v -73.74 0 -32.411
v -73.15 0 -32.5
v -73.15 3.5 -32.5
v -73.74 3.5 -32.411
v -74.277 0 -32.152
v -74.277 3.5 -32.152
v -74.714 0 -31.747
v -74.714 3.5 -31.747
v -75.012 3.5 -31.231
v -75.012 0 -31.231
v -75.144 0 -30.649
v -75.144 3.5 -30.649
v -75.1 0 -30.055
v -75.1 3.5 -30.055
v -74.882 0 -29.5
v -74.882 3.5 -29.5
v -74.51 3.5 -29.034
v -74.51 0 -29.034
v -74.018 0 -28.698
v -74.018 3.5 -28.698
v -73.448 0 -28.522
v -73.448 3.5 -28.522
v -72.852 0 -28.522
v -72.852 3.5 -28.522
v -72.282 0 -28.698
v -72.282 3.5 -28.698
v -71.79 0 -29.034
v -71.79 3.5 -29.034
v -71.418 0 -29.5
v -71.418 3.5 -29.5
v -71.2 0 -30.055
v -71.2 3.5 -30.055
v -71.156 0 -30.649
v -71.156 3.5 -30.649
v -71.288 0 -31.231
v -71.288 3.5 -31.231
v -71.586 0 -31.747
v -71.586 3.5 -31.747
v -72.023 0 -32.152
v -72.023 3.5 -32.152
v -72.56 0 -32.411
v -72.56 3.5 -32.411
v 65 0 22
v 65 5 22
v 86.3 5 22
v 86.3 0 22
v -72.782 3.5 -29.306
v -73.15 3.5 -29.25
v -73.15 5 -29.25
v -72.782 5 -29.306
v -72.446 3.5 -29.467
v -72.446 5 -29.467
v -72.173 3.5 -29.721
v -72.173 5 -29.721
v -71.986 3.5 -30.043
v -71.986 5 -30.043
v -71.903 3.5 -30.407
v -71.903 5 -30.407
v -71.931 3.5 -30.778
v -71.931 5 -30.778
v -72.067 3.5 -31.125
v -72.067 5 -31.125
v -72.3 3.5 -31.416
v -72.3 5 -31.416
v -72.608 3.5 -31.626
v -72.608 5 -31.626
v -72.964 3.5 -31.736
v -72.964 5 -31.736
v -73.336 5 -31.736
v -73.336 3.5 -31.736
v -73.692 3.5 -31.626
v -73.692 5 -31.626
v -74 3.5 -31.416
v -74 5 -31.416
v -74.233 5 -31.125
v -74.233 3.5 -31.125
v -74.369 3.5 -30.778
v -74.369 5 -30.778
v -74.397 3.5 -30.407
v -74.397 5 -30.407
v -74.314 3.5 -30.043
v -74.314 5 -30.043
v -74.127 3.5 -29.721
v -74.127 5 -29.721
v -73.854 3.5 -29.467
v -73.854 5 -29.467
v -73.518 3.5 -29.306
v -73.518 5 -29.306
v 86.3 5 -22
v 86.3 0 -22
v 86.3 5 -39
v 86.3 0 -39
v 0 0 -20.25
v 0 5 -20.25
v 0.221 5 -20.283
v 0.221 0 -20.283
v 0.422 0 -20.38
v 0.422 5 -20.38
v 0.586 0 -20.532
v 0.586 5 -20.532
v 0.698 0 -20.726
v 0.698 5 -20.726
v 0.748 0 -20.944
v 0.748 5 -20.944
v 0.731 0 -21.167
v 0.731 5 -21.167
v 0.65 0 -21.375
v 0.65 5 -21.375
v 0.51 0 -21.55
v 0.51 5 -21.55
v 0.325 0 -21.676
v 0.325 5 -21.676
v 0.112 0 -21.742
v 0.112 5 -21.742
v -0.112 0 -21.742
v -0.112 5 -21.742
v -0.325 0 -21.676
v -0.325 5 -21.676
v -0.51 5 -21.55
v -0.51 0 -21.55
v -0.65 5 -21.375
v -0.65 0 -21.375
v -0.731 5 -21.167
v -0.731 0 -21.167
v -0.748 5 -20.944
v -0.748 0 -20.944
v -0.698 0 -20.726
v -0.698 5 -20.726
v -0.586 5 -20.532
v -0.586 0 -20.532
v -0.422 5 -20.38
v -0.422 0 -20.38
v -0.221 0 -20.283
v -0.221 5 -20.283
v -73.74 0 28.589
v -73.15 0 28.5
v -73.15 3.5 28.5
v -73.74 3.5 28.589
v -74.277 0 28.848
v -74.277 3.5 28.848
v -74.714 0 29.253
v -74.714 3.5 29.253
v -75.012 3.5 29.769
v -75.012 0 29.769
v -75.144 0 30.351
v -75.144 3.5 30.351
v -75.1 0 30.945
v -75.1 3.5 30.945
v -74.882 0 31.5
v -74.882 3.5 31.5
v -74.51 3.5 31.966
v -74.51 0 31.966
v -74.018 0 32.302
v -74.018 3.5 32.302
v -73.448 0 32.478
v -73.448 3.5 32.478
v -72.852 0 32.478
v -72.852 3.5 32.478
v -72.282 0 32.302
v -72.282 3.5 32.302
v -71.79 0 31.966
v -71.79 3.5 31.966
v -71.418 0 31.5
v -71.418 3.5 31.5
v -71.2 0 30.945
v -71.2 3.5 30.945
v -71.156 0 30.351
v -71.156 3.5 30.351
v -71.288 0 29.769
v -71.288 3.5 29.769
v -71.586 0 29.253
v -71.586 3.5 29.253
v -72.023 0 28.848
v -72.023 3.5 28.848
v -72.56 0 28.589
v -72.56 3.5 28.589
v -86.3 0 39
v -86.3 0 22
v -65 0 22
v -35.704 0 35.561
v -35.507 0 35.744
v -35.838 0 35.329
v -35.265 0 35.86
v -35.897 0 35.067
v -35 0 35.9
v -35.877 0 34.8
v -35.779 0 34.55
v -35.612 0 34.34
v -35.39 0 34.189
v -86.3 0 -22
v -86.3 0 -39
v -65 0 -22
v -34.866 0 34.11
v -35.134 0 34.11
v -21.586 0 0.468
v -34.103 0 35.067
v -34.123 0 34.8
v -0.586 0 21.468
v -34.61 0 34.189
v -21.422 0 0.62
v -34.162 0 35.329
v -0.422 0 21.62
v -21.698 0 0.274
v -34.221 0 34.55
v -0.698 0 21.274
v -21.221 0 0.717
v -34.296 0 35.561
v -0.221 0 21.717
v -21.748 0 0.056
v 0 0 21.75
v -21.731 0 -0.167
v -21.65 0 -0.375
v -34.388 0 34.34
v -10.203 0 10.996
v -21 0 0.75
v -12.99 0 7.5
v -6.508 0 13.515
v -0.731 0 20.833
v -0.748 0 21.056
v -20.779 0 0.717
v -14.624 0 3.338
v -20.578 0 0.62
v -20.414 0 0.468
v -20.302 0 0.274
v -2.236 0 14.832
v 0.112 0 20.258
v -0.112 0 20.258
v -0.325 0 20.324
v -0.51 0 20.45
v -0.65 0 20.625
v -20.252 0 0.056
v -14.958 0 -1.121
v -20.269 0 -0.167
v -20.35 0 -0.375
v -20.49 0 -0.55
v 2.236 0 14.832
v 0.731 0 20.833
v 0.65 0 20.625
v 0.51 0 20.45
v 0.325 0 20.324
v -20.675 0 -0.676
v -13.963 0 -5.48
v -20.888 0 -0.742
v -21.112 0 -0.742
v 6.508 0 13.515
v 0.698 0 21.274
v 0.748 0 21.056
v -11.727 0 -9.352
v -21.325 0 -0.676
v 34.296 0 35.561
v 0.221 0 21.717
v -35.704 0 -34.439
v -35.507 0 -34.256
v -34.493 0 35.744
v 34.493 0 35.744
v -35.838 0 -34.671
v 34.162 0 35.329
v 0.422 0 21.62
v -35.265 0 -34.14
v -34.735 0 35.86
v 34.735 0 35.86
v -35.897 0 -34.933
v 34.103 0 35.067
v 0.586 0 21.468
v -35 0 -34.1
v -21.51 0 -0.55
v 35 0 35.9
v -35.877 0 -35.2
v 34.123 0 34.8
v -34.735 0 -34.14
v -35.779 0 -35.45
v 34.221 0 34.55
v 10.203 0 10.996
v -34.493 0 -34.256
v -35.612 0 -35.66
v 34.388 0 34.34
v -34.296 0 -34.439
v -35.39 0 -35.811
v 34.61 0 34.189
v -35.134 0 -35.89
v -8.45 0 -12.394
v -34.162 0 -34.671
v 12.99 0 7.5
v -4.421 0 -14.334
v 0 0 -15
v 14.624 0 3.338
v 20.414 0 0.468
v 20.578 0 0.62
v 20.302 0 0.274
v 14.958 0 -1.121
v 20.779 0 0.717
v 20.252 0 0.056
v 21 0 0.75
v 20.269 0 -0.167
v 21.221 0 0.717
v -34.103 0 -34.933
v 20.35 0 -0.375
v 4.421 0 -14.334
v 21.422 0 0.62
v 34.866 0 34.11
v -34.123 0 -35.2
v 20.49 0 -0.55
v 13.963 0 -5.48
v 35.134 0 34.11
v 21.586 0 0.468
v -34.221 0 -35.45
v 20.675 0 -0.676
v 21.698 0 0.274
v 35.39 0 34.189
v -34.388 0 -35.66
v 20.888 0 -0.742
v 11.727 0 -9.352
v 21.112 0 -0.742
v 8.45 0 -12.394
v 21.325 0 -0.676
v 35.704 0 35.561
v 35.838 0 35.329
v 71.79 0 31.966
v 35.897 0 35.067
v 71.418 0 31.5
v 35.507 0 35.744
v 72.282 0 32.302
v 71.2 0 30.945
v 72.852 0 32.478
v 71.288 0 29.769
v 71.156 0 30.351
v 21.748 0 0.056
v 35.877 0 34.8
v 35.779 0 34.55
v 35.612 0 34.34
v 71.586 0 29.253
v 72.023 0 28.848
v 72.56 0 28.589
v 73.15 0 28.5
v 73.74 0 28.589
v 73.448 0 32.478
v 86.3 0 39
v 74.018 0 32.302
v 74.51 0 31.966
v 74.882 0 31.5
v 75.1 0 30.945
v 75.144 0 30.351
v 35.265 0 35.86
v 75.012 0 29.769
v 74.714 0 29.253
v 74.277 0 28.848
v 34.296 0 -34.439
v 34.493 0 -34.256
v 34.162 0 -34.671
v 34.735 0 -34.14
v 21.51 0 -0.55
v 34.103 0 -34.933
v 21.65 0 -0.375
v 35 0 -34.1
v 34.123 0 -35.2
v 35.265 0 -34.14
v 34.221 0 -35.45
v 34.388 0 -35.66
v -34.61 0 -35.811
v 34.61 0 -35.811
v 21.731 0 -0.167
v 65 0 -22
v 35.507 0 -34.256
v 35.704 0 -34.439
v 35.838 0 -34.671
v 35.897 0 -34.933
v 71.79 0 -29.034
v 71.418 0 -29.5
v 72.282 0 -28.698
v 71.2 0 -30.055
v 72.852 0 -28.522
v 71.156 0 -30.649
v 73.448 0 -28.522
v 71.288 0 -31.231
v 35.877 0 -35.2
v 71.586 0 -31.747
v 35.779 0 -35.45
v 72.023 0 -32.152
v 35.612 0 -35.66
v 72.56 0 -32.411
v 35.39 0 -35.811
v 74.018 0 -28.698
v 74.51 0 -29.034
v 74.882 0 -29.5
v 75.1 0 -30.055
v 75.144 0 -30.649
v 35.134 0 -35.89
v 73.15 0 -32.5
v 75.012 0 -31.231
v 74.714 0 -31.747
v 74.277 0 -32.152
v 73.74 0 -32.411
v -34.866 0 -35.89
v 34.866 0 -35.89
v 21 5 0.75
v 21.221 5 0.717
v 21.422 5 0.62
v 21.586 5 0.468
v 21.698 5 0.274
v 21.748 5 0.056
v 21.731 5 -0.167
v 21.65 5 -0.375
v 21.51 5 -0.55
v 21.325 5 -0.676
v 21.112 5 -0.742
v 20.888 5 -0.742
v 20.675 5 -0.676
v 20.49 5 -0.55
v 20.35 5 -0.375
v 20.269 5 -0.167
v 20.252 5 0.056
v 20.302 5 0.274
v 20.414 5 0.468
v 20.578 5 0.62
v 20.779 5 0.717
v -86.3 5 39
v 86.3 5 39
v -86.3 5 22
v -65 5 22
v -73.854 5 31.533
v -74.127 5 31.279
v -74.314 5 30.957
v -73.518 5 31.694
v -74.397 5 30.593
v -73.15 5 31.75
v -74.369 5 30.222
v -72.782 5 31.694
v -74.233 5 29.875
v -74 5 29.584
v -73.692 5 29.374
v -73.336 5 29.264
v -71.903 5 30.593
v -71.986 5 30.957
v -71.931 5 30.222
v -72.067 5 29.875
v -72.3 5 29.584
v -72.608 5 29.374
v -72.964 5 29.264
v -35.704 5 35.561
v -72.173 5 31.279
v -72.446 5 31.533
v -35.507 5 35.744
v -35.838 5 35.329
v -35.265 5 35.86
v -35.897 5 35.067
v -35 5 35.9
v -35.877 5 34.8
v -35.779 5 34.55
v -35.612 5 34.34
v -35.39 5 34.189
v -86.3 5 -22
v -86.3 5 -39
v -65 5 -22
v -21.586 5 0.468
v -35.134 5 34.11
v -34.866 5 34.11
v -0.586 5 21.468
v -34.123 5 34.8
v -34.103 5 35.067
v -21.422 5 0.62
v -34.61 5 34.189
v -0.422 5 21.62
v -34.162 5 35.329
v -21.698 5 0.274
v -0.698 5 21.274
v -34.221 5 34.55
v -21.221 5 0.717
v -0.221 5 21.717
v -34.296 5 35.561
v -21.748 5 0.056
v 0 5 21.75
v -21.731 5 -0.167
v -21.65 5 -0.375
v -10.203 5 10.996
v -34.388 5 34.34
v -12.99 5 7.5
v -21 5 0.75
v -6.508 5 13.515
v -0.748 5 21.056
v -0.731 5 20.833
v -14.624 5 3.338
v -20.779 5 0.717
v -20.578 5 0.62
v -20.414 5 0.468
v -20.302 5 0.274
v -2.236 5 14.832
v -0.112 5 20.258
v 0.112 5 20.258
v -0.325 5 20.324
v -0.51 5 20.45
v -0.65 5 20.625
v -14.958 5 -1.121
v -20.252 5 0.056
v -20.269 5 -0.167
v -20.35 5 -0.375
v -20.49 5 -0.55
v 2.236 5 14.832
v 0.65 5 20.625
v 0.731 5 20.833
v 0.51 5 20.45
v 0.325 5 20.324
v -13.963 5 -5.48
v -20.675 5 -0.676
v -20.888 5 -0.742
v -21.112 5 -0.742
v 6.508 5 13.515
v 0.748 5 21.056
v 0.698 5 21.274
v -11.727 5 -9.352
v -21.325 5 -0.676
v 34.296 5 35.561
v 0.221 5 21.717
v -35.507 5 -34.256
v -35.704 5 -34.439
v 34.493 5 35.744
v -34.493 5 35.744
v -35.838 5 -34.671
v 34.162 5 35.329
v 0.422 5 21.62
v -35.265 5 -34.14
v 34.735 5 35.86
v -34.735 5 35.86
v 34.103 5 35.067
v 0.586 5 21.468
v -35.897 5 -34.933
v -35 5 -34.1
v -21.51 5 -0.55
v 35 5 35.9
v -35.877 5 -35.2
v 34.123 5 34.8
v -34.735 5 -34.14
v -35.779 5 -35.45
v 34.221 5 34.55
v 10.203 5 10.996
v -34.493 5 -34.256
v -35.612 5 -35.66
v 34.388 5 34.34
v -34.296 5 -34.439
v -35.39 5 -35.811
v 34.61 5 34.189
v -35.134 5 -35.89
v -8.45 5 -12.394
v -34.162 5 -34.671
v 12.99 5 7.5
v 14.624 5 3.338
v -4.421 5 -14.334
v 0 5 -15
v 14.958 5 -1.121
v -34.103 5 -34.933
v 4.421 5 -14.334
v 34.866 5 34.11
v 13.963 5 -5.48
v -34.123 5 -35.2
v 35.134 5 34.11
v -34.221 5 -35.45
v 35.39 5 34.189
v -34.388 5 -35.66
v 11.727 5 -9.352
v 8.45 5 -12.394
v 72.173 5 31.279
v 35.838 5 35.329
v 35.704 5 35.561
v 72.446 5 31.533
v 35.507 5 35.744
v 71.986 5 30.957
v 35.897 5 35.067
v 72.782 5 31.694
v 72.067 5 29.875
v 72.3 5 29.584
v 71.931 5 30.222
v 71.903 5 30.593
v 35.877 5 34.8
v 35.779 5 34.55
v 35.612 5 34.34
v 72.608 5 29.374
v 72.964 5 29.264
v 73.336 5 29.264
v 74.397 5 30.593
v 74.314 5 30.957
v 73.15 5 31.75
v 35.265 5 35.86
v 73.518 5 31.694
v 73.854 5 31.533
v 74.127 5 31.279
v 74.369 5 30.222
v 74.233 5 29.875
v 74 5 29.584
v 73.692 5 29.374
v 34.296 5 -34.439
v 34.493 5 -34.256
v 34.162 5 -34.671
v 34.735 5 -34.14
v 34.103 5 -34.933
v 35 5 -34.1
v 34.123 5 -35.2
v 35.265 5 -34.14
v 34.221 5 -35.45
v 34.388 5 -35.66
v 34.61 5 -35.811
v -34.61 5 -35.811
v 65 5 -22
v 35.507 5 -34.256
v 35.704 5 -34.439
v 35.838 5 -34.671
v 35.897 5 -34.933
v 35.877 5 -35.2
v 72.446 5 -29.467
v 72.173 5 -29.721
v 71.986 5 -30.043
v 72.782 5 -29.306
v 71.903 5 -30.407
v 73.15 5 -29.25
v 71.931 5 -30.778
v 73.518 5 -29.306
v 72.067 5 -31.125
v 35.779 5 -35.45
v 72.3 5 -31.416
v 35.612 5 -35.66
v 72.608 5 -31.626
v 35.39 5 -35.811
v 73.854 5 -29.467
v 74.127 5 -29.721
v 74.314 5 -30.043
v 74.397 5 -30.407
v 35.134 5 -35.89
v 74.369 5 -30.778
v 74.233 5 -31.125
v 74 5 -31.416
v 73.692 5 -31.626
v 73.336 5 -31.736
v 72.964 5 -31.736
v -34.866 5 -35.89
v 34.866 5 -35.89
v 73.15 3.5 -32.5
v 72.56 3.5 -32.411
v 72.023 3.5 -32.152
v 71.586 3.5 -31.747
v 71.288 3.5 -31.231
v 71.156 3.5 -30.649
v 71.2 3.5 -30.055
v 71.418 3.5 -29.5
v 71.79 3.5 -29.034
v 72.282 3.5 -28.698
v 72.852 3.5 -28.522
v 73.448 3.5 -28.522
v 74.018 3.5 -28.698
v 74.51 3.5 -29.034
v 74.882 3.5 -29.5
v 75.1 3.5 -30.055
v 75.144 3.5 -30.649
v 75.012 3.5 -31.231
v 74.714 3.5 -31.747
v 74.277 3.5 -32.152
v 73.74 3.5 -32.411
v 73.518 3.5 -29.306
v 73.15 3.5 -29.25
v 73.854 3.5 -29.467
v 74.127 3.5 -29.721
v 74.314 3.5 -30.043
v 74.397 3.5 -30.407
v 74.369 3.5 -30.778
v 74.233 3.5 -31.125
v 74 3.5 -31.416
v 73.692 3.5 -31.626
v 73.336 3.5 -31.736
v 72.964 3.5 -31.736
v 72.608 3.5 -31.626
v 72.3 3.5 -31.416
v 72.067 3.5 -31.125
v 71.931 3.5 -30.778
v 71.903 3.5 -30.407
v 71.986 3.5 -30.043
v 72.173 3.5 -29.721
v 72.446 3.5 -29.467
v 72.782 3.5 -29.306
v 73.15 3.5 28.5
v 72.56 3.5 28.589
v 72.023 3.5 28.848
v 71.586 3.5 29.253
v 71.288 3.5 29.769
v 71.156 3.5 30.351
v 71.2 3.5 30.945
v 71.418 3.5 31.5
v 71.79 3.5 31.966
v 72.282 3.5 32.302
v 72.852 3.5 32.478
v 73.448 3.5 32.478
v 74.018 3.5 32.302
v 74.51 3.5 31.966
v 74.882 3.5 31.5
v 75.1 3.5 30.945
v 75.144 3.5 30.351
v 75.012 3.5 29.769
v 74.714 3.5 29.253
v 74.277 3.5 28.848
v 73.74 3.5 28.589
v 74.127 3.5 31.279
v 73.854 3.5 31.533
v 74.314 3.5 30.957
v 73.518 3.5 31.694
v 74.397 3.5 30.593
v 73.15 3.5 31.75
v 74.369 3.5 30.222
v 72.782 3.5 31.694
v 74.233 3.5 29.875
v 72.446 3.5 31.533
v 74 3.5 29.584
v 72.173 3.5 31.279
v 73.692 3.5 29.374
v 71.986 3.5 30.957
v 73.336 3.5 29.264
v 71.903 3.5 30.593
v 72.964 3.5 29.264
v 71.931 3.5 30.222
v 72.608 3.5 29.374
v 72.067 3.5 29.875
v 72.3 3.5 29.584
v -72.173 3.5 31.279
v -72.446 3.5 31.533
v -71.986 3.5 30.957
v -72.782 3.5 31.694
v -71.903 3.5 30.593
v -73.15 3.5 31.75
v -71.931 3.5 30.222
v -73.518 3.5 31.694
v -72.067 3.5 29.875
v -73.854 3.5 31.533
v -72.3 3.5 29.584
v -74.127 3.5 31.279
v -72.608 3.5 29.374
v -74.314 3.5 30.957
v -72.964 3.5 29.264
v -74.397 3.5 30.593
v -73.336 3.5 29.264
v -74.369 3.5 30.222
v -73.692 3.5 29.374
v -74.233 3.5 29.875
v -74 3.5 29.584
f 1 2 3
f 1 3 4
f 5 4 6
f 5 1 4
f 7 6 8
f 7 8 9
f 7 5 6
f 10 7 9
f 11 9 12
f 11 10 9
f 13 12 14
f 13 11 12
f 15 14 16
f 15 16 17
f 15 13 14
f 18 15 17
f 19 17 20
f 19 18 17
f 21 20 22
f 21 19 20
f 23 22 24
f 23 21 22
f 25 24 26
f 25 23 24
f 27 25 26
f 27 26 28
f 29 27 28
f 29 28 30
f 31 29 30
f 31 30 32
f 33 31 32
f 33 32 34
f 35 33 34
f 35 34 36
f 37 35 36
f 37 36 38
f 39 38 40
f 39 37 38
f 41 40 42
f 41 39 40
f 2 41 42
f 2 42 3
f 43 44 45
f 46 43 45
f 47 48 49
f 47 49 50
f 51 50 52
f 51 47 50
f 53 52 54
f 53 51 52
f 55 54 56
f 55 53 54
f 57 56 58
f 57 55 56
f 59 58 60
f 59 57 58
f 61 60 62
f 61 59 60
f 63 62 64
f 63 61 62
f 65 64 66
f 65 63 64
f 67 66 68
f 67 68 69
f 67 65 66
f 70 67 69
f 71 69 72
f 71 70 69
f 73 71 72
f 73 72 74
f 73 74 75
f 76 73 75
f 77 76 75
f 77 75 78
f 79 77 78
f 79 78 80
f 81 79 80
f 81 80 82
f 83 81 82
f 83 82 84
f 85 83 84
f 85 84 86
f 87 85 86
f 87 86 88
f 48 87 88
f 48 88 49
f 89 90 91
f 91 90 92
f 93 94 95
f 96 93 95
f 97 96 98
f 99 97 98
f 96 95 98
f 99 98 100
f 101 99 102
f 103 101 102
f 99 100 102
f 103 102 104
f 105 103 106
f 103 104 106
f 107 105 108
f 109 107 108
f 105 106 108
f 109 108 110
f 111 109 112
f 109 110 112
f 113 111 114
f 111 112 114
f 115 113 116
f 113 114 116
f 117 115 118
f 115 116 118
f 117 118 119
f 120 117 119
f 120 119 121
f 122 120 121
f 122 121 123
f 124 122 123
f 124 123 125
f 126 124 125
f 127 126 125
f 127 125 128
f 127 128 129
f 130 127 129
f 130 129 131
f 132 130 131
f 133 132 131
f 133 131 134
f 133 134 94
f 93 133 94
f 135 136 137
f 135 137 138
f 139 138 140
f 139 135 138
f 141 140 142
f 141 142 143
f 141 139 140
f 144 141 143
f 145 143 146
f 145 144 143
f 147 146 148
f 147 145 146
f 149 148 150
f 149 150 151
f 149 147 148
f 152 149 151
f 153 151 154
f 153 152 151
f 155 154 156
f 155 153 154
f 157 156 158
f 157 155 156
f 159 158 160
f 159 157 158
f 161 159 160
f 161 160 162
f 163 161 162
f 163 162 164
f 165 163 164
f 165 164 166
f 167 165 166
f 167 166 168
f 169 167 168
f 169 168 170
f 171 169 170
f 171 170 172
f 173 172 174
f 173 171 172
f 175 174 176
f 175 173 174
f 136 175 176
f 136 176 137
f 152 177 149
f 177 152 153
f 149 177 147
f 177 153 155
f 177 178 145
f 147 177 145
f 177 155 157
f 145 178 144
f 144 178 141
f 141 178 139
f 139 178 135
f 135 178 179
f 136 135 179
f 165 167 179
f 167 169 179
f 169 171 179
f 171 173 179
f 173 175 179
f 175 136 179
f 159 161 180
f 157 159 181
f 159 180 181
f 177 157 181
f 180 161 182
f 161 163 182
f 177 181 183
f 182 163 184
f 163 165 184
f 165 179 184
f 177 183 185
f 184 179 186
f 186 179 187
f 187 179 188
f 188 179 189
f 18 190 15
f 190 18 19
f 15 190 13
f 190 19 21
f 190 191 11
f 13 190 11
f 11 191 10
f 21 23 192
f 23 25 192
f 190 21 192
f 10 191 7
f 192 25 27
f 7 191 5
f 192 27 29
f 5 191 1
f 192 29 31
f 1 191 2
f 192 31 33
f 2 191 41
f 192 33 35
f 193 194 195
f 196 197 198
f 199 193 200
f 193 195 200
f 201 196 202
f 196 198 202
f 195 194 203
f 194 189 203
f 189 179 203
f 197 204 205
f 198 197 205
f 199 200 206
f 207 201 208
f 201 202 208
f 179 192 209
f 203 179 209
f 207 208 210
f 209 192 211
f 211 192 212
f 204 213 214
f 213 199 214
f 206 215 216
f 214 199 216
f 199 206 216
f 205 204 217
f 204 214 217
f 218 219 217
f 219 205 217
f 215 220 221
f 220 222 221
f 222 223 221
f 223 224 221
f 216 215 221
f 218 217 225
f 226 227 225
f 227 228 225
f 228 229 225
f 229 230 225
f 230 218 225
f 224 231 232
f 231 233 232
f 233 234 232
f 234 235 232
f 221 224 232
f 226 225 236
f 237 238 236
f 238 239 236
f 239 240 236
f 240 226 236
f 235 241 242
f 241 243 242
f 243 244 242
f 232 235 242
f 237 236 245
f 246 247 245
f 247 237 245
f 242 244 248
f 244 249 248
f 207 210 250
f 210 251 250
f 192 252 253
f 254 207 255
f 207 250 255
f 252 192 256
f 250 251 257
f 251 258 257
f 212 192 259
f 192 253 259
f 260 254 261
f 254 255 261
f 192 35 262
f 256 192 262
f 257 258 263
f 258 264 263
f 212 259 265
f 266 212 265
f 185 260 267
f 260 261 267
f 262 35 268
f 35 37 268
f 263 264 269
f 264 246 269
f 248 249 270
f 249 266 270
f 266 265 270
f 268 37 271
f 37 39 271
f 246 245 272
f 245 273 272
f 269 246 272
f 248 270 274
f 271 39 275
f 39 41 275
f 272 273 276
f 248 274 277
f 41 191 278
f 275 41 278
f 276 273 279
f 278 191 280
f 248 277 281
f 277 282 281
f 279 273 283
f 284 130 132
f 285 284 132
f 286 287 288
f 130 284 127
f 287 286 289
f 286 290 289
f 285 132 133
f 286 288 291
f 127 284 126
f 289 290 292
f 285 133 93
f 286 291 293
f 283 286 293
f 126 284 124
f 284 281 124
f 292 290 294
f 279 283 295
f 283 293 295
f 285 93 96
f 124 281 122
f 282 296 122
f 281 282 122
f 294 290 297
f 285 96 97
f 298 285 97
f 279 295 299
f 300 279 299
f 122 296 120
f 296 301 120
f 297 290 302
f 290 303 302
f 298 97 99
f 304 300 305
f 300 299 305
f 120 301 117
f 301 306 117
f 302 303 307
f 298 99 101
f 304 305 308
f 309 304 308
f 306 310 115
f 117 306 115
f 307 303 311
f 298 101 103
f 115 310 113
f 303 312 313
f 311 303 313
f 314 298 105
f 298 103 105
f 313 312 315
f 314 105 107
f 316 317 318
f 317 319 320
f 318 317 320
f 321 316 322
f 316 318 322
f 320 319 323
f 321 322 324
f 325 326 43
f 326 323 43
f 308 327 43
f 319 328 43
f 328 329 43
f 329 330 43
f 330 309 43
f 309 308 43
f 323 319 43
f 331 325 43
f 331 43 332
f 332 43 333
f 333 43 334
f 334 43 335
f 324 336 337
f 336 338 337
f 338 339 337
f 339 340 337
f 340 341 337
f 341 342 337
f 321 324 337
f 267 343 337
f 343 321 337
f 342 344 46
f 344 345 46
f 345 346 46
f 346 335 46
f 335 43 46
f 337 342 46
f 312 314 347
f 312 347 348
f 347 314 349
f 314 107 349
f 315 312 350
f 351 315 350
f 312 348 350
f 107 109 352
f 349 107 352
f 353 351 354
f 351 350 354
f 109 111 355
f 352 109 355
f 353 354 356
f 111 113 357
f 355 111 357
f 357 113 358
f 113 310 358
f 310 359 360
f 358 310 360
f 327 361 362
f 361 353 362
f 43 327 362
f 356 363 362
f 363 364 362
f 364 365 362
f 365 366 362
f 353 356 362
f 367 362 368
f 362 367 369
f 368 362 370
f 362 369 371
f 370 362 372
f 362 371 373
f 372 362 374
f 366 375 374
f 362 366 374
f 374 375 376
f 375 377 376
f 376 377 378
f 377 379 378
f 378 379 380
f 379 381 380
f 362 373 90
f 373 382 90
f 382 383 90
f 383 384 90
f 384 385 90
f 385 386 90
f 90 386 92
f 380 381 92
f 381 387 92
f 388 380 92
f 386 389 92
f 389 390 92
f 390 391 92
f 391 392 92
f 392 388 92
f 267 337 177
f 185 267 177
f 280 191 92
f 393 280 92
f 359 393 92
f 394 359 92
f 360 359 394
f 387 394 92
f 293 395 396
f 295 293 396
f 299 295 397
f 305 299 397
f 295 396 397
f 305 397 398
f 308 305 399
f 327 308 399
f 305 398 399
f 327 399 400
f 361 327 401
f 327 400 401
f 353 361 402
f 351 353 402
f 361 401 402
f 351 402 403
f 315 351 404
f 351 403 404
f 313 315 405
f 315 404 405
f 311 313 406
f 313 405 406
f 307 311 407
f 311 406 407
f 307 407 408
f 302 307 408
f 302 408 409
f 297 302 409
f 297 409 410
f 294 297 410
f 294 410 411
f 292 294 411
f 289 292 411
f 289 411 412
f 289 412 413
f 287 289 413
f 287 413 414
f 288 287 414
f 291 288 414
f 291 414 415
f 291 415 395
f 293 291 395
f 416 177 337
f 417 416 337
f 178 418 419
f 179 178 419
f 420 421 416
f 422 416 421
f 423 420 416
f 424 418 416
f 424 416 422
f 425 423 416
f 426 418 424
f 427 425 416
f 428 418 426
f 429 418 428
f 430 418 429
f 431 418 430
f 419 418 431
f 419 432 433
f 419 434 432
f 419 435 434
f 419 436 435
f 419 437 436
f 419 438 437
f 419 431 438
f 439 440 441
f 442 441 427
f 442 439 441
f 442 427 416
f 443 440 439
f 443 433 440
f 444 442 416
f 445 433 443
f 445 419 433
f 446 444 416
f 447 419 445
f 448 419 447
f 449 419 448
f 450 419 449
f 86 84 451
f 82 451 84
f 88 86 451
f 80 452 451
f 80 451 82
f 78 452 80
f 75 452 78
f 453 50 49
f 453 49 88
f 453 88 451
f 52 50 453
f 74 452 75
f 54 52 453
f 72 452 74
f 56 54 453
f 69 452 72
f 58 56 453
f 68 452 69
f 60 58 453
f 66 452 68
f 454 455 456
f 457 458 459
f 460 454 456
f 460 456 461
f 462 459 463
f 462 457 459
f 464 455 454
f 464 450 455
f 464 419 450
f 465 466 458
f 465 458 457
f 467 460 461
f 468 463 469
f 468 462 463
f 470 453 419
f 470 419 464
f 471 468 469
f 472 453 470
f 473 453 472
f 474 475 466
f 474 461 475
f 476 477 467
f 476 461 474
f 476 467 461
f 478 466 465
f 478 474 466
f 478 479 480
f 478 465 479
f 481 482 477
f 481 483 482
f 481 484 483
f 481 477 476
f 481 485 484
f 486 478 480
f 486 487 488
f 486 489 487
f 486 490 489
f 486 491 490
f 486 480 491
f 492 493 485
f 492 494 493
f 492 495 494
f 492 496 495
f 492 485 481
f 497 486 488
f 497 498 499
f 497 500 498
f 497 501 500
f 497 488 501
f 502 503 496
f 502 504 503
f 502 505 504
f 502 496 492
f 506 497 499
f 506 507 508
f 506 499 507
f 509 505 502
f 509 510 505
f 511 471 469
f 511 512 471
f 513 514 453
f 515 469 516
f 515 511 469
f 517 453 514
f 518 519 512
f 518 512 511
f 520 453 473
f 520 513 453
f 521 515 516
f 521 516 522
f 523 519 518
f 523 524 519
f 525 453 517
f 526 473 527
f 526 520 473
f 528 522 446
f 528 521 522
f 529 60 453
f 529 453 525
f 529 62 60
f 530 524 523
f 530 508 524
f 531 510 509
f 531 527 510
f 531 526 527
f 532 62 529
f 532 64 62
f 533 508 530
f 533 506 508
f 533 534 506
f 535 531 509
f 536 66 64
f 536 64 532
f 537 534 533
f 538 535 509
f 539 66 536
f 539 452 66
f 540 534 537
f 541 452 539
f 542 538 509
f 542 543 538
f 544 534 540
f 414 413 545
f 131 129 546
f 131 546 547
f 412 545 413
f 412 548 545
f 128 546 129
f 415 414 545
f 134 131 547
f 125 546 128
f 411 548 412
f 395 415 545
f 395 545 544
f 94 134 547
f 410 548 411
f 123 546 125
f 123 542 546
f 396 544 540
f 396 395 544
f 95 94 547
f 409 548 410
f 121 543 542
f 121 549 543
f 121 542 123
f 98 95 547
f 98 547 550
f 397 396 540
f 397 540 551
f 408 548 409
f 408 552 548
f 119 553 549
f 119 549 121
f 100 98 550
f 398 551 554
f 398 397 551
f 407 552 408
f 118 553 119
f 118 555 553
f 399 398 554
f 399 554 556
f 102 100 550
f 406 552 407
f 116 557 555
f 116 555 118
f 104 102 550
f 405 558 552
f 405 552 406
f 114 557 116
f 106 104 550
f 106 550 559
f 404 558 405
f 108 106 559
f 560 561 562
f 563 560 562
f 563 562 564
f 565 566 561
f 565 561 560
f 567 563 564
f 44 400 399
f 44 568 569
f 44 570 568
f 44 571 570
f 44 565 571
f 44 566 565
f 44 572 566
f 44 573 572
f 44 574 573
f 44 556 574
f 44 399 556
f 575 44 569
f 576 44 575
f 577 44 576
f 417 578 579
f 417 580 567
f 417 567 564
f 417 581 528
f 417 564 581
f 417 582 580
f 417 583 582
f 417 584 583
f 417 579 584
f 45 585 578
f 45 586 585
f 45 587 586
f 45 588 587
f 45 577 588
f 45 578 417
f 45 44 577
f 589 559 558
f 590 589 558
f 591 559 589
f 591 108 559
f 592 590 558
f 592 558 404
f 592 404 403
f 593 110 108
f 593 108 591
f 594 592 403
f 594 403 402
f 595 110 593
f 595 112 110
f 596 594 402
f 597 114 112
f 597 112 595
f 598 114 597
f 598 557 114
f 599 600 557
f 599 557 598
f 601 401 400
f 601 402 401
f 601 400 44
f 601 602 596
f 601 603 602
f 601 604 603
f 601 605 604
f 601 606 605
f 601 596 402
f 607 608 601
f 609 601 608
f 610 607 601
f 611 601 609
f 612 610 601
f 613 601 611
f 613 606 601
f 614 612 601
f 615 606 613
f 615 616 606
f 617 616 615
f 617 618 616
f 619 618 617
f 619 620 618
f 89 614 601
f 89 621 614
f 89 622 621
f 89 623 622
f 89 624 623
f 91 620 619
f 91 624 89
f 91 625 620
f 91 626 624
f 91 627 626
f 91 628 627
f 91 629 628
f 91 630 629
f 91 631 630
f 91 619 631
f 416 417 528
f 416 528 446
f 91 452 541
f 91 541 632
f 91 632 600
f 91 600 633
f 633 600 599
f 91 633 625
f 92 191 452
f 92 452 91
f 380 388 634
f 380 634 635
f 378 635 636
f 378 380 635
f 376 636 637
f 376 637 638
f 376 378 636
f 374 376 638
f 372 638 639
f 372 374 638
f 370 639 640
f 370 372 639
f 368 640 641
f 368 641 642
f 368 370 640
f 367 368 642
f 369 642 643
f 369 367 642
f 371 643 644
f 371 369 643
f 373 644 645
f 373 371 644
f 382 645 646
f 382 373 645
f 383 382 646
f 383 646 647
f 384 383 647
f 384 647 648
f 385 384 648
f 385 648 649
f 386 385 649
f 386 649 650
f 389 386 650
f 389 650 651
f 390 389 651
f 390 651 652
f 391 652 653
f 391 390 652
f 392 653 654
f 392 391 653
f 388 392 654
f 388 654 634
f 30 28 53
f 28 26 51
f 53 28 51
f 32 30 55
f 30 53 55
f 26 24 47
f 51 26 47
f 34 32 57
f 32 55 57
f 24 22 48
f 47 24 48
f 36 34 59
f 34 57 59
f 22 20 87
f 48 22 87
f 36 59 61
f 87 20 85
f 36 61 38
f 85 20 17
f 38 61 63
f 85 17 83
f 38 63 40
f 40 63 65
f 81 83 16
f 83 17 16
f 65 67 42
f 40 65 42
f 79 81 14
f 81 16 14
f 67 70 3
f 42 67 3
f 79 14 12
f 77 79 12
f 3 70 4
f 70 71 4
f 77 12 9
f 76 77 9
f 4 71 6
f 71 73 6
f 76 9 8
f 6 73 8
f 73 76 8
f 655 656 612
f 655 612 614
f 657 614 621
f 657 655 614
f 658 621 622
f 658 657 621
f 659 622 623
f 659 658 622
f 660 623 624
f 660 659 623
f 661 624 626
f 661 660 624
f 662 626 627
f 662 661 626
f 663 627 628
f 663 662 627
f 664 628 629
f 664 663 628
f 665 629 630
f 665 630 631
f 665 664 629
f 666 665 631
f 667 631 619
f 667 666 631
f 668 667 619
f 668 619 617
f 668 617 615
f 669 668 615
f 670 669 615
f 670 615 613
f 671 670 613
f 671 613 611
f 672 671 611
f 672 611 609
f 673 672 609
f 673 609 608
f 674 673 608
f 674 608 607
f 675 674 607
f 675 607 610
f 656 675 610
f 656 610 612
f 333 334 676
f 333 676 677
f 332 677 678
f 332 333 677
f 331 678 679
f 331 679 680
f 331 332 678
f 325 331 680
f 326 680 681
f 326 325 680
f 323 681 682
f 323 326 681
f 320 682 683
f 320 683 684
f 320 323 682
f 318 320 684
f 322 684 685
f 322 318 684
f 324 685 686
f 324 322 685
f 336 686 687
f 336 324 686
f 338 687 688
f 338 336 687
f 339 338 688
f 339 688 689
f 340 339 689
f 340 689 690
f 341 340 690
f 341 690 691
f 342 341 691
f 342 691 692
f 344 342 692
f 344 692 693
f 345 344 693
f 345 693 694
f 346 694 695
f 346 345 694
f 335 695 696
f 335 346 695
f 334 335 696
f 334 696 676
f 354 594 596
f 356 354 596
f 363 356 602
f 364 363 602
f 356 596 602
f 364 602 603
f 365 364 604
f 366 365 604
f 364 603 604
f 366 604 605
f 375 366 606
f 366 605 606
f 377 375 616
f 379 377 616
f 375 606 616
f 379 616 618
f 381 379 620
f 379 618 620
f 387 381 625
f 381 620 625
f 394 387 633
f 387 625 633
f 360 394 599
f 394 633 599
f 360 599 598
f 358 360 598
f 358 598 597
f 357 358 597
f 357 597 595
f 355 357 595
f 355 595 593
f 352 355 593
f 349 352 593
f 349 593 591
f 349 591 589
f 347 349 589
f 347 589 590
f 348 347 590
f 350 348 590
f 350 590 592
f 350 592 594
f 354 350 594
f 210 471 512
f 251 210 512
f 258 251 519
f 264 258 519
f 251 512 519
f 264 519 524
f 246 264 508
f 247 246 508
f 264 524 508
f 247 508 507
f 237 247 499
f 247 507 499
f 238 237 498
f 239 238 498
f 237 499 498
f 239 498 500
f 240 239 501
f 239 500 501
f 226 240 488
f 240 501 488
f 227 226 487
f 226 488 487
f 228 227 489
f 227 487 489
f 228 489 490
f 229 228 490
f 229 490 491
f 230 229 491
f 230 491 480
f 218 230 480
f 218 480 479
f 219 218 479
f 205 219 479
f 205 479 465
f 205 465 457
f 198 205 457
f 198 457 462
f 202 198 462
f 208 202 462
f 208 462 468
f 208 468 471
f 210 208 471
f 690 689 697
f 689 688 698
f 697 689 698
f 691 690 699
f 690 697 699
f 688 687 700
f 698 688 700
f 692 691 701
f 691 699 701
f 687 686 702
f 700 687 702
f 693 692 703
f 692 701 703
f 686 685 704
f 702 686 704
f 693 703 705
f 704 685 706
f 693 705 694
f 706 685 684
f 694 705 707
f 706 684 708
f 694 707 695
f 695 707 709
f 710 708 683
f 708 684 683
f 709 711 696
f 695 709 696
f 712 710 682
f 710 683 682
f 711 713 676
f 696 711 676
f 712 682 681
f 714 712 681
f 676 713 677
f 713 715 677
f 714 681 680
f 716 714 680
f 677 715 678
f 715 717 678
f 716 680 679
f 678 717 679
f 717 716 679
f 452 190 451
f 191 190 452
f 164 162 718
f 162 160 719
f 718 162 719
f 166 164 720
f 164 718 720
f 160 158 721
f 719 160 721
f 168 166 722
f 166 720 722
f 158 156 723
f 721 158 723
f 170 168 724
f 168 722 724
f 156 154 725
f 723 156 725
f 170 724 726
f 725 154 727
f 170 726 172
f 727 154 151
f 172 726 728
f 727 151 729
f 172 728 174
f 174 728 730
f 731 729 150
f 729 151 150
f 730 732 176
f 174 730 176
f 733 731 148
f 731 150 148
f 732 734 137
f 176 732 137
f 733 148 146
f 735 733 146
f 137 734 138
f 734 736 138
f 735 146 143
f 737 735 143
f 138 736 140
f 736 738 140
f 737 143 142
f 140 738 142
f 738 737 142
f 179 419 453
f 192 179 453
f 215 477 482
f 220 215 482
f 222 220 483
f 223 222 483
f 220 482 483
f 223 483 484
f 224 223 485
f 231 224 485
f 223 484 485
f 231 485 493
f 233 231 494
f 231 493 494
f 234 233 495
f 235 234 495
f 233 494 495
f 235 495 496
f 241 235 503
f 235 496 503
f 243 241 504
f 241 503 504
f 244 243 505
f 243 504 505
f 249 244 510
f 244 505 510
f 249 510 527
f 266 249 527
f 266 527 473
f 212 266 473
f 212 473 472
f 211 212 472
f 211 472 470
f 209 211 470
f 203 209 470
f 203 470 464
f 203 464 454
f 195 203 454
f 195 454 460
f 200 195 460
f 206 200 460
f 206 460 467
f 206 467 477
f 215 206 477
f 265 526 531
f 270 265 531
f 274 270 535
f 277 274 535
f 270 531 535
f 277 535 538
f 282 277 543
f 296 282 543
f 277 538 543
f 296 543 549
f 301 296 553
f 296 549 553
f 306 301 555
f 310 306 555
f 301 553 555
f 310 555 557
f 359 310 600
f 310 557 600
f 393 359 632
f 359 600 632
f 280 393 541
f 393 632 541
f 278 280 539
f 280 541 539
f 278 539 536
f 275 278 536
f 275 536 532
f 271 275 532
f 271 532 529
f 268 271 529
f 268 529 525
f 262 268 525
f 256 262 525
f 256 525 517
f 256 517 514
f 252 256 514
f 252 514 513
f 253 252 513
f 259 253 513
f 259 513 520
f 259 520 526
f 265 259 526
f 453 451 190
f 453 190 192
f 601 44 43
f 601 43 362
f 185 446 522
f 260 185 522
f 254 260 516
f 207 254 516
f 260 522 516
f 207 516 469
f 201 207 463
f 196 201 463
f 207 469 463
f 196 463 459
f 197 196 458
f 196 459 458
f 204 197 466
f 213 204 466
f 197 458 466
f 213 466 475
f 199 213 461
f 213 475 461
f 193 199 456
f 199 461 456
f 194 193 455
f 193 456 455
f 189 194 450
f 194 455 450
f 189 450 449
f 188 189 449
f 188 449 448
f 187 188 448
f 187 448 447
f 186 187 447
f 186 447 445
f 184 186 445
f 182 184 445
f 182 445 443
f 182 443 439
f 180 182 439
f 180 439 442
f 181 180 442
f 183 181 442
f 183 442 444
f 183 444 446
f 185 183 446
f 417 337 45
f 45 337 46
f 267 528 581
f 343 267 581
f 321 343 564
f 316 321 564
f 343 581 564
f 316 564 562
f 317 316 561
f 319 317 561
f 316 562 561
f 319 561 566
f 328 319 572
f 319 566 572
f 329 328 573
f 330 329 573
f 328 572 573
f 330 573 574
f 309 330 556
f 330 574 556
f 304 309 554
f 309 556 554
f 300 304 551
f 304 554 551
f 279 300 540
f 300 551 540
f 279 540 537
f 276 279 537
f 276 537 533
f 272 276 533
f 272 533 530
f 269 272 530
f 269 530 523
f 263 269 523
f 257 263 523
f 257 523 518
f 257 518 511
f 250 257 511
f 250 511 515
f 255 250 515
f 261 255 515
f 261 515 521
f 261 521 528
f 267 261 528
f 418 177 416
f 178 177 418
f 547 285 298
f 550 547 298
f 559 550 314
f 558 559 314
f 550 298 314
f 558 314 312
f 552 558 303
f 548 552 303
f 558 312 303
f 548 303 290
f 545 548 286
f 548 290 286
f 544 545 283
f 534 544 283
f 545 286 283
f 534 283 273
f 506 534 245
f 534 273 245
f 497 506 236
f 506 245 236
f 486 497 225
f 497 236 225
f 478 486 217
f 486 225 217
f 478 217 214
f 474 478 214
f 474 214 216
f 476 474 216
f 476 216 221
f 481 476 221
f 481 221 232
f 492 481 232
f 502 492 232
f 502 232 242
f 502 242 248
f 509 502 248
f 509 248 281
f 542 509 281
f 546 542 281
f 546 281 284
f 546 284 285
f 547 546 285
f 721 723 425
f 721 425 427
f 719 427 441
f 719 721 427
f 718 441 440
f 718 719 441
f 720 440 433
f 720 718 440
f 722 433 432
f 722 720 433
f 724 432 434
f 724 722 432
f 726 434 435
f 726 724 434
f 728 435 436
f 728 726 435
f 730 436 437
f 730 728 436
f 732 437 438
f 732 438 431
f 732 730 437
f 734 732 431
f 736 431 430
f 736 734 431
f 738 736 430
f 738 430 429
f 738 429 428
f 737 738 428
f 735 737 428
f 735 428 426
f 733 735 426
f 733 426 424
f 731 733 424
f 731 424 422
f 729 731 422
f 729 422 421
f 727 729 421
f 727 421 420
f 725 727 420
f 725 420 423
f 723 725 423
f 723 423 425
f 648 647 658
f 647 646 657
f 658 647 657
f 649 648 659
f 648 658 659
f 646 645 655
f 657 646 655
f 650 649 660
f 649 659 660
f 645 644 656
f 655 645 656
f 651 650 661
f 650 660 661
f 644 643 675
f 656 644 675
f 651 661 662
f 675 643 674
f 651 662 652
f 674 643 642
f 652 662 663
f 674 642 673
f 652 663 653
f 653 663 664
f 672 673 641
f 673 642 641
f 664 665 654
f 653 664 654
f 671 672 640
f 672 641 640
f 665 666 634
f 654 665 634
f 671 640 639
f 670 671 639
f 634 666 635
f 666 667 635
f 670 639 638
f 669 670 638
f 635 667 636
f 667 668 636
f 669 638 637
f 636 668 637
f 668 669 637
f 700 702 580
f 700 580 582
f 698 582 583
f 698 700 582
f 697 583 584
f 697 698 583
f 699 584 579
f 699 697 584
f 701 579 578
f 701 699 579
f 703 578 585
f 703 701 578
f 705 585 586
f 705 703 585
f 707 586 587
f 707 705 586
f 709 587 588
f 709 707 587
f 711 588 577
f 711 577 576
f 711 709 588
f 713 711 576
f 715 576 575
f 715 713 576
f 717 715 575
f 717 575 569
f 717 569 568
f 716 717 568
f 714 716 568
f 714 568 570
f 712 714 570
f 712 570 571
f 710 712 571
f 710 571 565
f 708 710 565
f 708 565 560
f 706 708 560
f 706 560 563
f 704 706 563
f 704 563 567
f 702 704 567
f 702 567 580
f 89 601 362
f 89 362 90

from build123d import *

# Parameters (mm, degrees)
SKETCH_1_W          = 172.6
SKETCH_1_H          = 78
SKETCH_1_R          = 1.25
EXTRUDE_1_DEPTH     = 5
SKETCH_2_W          = 21.3
SKETCH_2_H          = 44
CUT_EXTRUDE_1_DEPTH = 95.835067354
SKETCH_1_3_R        = 2
CUT_EXTRUDE_2_DEPTH = 3.5
SKETCH_3_R          = 0.9
CUT_EXTRUDE_3_DEPTH = 95.835067354
SKETCH_4_R          = 15
CUT_EXTRUDE_4_DEPTH = 95.835067354
SKETCH_5_R          = 0.75
CUT_EXTRUDE_5_DEPTH = 95.835067354


with BuildPart() as part:
    # 草图1 → 凸台-拉伸1 (new body)
    with BuildSketch(Plane(origin=(0, 0, 0), x_dir=(1, 0, 0), z_dir=(0, 1, 0))):
        Rectangle(SKETCH_1_W, SKETCH_1_H)
        with Locations(Location((-73.15, 30.5, 0), (0, 0, 270))):
            Circle(SKETCH_1_R, mode=Mode.SUBTRACT)
        with Locations(Location((-73.15, -30.5, 0), (0, 0, 270))):
            Circle(SKETCH_1_R, mode=Mode.SUBTRACT)
        with Locations(Location((73.15, 30.5, 0), (0, 0, 270))):
            Circle(SKETCH_1_R, mode=Mode.SUBTRACT)
        with Locations(Location((73.15, -30.5, 0), (0, 0, 270))):
            Circle(SKETCH_1_R, mode=Mode.SUBTRACT)
    extrude(amount=EXTRUDE_1_DEPTH)

    # 草图2 → 切除-拉伸1 (cut, through all)
    with BuildSketch(Plane(origin=(0, 5, 0), x_dir=(1, 0, 0), z_dir=(0, 1, 0))):
        with Locations((-75.65, 0)):
            Rectangle(SKETCH_2_W, SKETCH_2_H)
        with Locations((75.65, 0)):
            Rectangle(SKETCH_2_W, SKETCH_2_H)
    extrude(amount=-CUT_EXTRUDE_1_DEPTH, mode=Mode.SUBTRACT)

    # 草图1<3> → 切除-拉伸2 (cut)
    with BuildSketch(Plane(origin=(0, 0, 0), x_dir=(1, 0, 0), z_dir=(0, 1, 0))):
        with Locations(Location((-73.15, 30.5, 0), (0, 0, 90))):
            Circle(SKETCH_1_3_R)
        with Locations(Location((-73.15, -30.5, 0), (0, 0, 90))):
            Circle(SKETCH_1_3_R)
        with Locations(Location((73.15, 30.5, 0), (0, 0, 90))):
            Circle(SKETCH_1_3_R)
        with Locations(Location((73.15, -30.5, 0), (0, 0, 90))):
            Circle(SKETCH_1_3_R)
    extrude(amount=CUT_EXTRUDE_2_DEPTH, mode=Mode.SUBTRACT)

    # 草图3 → 切除-拉伸3 (cut, through all)
    with BuildSketch(Plane(origin=(0, 5, 0), x_dir=(1, 0, 0), z_dir=(0, 1, 0))):
        with Locations(Location((-35, 35, 0), (0, 0, 270))):
            Circle(SKETCH_3_R)
        with Locations(Location((35, 35, 0), (0, 0, 270))):
            Circle(SKETCH_3_R)
        with Locations(Location((-35, -35, 0), (0, 0, 270))):
            Circle(SKETCH_3_R)
        with Locations(Location((35, -35, 0), (0, 0, 270))):
            Circle(SKETCH_3_R)
    extrude(amount=-CUT_EXTRUDE_3_DEPTH, mode=Mode.SUBTRACT)

    # 草图4 → 切除-拉伸4 (cut, through all)
    with BuildSketch(Plane.XZ):
        with Locations(Location((0, 0, 0), (0, 0, 270))):
            Circle(SKETCH_4_R)
    extrude(amount=-CUT_EXTRUDE_4_DEPTH, mode=Mode.SUBTRACT)

    # 草图5 → 切除-拉伸5 (cut, through all)
    with BuildSketch(Plane(origin=(0, 5, 0), x_dir=(1, 0, 0), z_dir=(0, 1, 0))):
        with Locations(Location((0, 21, 0), (0, 0, 270))):
            Circle(SKETCH_5_R)
        with Locations(Location((21, 0, 0), (0, 0, 270))):
            Circle(SKETCH_5_R)
        with Locations(Location((-21, 0, 0), (0, 0, 270))):
            Circle(SKETCH_5_R)
        with Locations(Location((0, -21, 0), (0, 0, 270))):
            Circle(SKETCH_5_R)
    extrude(amount=-CUT_EXTRUDE_5_DEPTH, mode=Mode.SUBTRACT)


solid = part.part
